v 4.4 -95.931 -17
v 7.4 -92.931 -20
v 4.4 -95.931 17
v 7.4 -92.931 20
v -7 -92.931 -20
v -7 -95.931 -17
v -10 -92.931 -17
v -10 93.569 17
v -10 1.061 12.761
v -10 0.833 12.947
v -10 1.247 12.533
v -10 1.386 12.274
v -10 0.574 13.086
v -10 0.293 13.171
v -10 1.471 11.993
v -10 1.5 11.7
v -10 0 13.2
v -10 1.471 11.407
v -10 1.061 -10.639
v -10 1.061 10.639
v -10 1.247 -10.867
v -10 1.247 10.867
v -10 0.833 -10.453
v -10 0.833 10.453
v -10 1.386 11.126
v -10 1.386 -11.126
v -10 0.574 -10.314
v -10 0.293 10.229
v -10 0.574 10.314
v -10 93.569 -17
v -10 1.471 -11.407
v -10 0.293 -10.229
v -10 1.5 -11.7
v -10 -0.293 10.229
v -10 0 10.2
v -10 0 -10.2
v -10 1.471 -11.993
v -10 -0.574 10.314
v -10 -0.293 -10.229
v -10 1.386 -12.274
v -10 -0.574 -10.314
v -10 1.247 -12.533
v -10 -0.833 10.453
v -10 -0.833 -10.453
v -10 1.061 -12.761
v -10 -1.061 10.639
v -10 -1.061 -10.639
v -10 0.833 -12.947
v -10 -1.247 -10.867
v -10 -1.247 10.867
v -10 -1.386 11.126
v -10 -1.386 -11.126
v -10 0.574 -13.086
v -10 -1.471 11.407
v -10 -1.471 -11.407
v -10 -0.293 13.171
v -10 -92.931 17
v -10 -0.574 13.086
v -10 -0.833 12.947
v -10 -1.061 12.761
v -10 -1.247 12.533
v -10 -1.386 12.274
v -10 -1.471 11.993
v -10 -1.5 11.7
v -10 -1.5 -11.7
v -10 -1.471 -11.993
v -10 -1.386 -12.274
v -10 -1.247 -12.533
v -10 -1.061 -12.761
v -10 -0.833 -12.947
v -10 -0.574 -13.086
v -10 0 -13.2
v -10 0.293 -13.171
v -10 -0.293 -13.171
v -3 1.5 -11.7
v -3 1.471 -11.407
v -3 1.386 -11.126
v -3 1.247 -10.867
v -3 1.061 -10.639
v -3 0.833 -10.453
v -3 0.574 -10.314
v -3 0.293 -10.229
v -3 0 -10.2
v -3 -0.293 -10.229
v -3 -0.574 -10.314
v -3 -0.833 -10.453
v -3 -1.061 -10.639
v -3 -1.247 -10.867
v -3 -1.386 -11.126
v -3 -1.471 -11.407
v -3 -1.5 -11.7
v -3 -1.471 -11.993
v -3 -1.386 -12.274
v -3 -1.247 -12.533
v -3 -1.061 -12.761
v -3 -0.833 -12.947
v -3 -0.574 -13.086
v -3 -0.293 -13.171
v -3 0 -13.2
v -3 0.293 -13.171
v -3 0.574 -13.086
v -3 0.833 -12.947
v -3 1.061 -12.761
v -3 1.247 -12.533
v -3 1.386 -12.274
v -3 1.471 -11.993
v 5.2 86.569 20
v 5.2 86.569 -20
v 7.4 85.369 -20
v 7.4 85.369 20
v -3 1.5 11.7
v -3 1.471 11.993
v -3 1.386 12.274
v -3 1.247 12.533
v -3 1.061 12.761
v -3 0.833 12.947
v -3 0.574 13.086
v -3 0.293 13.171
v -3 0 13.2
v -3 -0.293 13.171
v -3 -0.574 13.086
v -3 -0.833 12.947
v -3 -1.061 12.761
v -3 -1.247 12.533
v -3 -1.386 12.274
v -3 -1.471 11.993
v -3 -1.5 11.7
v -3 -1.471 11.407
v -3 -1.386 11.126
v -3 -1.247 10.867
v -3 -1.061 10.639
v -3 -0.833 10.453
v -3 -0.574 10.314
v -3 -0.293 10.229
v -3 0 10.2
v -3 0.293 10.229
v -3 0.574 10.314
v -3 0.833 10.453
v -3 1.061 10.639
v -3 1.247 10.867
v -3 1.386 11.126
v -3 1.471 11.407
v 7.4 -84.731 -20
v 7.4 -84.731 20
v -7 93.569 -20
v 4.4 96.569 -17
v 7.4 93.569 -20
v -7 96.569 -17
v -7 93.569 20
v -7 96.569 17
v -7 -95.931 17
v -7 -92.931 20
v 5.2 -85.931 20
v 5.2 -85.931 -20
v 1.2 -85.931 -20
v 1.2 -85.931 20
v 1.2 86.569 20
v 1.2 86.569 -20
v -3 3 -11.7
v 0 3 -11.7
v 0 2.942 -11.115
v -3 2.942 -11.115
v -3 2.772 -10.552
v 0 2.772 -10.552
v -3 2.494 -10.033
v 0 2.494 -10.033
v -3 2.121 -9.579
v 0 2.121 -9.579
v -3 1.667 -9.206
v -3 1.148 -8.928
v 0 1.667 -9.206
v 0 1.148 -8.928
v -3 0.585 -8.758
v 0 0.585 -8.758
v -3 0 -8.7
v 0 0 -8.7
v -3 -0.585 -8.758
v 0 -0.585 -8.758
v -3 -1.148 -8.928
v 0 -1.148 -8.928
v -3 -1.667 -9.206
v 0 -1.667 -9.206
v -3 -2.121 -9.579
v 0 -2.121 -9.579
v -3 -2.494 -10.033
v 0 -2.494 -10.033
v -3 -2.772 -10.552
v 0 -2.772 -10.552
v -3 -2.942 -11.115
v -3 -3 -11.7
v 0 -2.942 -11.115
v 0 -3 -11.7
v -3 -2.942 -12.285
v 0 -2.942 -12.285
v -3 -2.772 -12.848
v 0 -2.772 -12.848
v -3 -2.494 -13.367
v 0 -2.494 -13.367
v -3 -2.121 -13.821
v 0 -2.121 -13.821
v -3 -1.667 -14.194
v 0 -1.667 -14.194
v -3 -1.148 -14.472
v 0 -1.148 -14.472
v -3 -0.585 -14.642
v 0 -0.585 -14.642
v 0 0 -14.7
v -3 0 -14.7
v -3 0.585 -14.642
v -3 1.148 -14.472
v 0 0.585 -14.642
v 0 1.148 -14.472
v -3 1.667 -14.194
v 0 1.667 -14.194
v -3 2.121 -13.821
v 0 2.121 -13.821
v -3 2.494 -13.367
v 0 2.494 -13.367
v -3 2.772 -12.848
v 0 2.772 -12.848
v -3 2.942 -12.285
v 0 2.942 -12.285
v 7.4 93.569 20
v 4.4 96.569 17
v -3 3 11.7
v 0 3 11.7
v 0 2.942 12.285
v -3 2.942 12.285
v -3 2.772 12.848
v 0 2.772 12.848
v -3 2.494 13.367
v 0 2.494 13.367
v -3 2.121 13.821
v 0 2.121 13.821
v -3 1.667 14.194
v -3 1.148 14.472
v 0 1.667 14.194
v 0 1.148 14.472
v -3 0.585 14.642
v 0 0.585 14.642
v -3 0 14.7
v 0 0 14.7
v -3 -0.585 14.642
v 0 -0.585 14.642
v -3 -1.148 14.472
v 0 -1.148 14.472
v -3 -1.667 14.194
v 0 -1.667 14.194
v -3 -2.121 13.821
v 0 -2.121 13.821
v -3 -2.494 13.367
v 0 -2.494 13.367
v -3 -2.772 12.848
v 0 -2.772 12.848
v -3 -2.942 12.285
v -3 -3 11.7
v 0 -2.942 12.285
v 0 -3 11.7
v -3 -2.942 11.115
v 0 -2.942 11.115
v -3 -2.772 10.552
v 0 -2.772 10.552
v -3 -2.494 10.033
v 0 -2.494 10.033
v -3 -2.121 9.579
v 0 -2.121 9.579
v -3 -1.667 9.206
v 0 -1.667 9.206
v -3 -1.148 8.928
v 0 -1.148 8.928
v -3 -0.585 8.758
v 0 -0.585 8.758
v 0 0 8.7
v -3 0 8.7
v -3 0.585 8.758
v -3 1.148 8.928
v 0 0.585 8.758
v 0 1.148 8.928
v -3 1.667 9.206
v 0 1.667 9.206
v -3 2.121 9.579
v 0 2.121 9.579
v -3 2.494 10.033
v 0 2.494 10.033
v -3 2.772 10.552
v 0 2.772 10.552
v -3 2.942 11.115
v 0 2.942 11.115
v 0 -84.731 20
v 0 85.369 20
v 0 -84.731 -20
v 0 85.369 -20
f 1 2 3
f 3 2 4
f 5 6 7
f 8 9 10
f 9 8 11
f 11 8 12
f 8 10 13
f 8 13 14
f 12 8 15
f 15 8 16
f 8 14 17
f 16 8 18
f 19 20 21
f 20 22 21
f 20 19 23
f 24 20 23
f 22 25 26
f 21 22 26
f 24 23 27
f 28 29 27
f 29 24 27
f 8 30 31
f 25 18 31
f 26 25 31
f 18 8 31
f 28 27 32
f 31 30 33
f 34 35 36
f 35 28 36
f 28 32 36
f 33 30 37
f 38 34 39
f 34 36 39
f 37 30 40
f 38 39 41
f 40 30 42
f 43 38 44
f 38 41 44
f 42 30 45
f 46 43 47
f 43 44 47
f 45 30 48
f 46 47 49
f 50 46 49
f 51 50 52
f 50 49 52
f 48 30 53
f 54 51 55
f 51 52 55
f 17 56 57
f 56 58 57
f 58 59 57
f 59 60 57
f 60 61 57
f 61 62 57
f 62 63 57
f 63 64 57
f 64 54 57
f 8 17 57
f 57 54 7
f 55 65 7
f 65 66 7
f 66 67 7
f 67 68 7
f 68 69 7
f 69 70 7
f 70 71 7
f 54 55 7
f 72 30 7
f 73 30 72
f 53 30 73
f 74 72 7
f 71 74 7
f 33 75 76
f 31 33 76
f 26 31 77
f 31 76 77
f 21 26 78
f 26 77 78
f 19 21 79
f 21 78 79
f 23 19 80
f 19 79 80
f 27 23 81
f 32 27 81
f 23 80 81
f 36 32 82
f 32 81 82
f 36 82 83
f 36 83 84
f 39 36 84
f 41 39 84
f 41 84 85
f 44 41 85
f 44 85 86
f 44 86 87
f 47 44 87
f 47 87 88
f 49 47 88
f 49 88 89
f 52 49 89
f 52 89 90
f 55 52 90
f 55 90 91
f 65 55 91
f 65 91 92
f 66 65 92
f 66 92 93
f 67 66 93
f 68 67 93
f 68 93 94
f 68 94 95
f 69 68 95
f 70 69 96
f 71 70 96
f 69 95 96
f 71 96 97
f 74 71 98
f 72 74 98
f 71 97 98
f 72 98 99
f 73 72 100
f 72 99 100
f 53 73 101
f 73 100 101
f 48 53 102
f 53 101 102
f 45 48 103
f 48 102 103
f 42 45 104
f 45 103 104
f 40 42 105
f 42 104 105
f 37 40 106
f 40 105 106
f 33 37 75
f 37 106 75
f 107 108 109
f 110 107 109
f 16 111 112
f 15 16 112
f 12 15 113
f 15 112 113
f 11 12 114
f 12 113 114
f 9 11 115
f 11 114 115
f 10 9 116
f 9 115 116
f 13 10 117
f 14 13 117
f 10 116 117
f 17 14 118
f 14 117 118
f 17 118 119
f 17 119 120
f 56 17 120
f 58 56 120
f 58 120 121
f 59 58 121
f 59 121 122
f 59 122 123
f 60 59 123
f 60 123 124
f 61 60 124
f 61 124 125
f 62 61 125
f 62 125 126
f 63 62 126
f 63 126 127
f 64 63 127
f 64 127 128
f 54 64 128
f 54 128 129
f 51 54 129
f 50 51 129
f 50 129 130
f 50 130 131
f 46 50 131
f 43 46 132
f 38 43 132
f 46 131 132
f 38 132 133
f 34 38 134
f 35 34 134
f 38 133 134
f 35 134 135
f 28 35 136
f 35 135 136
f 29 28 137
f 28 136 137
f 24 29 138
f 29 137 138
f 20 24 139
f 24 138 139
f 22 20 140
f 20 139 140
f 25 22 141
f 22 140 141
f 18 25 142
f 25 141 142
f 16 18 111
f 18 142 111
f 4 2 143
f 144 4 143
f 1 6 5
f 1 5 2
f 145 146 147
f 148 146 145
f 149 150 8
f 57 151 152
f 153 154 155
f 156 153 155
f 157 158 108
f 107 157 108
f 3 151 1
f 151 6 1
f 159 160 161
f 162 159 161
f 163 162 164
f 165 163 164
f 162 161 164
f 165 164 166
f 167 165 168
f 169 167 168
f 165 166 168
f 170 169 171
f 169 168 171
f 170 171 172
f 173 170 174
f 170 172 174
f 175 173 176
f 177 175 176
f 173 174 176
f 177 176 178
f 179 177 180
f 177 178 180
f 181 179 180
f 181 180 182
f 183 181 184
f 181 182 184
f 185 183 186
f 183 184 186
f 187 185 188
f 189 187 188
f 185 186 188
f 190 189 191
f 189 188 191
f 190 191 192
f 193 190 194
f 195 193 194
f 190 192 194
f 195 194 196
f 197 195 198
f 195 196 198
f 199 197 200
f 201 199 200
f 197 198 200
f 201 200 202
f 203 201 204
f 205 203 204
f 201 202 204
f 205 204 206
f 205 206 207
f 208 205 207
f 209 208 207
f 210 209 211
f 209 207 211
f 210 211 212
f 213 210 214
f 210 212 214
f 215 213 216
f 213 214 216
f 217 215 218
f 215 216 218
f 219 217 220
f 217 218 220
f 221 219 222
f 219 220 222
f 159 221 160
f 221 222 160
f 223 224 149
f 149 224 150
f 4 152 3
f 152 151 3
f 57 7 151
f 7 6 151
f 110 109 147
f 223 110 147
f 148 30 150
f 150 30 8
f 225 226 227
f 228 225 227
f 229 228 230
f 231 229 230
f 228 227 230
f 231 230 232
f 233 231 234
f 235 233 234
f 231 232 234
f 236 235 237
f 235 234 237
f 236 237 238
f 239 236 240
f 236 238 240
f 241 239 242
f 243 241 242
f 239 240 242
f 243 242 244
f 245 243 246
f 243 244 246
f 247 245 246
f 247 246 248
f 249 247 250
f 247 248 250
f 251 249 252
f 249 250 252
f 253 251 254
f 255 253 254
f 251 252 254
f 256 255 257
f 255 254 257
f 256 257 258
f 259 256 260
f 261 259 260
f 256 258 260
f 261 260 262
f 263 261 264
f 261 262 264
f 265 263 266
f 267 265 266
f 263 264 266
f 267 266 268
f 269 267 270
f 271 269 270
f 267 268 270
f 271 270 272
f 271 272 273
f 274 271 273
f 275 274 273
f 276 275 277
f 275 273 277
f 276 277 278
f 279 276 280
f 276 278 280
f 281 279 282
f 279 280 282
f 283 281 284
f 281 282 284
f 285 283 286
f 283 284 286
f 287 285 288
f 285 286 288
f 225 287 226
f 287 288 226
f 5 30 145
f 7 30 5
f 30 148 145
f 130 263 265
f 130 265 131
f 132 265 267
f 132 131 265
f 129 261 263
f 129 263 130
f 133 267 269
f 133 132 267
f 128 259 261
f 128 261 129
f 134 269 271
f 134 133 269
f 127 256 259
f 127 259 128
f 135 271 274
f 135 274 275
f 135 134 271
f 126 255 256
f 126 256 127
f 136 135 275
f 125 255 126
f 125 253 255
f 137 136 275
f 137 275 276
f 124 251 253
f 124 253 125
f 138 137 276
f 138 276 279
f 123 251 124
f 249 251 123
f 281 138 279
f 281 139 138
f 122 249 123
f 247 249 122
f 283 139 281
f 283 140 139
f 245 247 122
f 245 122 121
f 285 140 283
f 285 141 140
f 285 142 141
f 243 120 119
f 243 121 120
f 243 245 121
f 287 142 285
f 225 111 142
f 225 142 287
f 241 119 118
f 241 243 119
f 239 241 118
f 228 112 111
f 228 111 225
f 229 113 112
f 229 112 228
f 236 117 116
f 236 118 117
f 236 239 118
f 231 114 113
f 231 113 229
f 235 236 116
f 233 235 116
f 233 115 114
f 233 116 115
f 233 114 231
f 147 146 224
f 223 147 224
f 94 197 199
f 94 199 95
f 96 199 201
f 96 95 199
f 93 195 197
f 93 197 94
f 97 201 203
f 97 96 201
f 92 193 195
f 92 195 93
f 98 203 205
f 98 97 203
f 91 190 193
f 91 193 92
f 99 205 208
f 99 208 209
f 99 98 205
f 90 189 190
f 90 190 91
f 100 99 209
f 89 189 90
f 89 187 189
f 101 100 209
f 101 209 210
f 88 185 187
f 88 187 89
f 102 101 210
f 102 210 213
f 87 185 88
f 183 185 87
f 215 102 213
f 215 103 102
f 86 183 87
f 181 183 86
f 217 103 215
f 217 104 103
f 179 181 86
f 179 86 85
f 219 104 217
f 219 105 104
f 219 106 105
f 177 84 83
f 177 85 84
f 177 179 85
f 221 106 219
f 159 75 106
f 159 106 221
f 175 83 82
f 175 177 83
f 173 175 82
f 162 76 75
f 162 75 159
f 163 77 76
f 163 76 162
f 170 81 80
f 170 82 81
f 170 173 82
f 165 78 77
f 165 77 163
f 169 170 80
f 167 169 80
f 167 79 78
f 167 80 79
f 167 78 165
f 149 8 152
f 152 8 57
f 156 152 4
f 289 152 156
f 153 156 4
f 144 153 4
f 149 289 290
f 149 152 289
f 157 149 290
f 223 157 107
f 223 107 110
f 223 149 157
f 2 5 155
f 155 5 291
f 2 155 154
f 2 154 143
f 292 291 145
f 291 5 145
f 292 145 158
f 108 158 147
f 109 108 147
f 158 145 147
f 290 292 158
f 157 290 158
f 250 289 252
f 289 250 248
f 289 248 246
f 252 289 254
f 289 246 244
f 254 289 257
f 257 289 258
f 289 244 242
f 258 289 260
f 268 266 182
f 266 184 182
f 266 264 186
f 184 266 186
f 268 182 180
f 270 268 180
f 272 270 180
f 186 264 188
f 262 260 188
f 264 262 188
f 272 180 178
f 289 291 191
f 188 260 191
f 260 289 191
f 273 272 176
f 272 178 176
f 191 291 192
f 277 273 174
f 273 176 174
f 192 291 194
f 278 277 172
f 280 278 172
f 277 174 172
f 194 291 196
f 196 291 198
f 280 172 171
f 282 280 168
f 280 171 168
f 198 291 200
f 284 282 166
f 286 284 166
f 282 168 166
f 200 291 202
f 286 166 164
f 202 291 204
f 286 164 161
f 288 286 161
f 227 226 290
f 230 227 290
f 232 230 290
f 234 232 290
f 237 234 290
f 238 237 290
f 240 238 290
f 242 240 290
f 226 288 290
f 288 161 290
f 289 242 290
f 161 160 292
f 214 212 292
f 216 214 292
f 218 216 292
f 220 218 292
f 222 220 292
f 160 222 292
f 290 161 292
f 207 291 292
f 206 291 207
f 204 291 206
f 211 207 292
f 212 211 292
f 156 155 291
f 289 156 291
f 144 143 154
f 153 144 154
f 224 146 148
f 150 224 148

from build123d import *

# Parameters (mm, degrees)
F1_DEPTH = 40
F3_R     = 3
F4_DEPTH = 3
F5_R     = 1.5
F6_DEPTH = 12
F7_SIZE  = 3


with BuildPart() as f1:
    # F0 (on Top) → F1 (new body)
    with BuildSketch(Plane.XY):
        Polygon((0, 85.3687158704), (0, 86.5687158704), (-10, 86.5687158704), (-10, -85.9312841296), (0, -85.9312841296), (0, -84.7312841296), align=None)
        Polygon((1.2, 86.5687158704), (0, 86.5687158704), (0, 85.3687158704), align=None)
        Polygon((-10, 86.5687158704), (0, 86.5687158704), (1.2, 86.5687158704), (5.2, 86.5687158704), (7.4, 86.5687158704), (7.4, 96.5687158704), (-10, 96.5687158704), align=None)
        Polygon((0, -85.9312841296), (-10, -85.9312841296), (-10, -95.9312841296), (7.4, -95.9312841296), (7.4, -85.9312841296), (5.2, -85.9312841296), (1.2, -85.9312841296), align=None)
        Polygon((1.2, -85.9312841296), (0, -84.7312841296), (0, -85.9312841296), align=None)
        Polygon((7.4, 86.5687158704), (5.2, 86.5687158704), (7.4, 85.3687158704), align=None)
        Polygon((7.4, -84.7312841296), (5.2, -85.9312841296), (7.4, -85.9312841296), align=None)
    extrude(amount=F1_DEPTH)


with BuildPart() as f1_1:
    # F2: moved
    add(f1.part.moved(Location((0, 0, -20))))

    # F3 (on face) → F4 (cut)
    with BuildSketch(Plane.YZ):
        with Locations((0, 11.7)):
            Circle(F3_R)
        with Locations((0, -11.7)):
            Circle(F3_R)
    extrude(amount=-F4_DEPTH, mode=Mode.SUBTRACT)

    # F5 (on face) → F6 (cut)
    with BuildSketch(Plane.YZ):
        with Locations((0, 11.7)):
            Circle(F5_R)
        with Locations((0, -11.7)):
            Circle(F5_R)
    extrude(amount=-F6_DEPTH, mode=Mode.SUBTRACT)

    # F7
    f7_edges = [f1_1.edges().sort_by_distance(p)[0] for p in [
        (-1.3, -95.931284, 20),
        (-10, -95.931284, 0),
        (7.4, -95.931284, 0),
        (-1.3, -95.931284, -20),
        (7.4, 96.568716, 0),
        (-10, 96.568716, 0),
        (-1.3, 96.568716, -20),
        (-1.3, 96.568716, 20),
        (-10, 0.318716, 20),
        (-10, 0.318716, -20),
    ]]
    chamfer(f7_edges, length=F7_SIZE)


solid = f1_1.part
